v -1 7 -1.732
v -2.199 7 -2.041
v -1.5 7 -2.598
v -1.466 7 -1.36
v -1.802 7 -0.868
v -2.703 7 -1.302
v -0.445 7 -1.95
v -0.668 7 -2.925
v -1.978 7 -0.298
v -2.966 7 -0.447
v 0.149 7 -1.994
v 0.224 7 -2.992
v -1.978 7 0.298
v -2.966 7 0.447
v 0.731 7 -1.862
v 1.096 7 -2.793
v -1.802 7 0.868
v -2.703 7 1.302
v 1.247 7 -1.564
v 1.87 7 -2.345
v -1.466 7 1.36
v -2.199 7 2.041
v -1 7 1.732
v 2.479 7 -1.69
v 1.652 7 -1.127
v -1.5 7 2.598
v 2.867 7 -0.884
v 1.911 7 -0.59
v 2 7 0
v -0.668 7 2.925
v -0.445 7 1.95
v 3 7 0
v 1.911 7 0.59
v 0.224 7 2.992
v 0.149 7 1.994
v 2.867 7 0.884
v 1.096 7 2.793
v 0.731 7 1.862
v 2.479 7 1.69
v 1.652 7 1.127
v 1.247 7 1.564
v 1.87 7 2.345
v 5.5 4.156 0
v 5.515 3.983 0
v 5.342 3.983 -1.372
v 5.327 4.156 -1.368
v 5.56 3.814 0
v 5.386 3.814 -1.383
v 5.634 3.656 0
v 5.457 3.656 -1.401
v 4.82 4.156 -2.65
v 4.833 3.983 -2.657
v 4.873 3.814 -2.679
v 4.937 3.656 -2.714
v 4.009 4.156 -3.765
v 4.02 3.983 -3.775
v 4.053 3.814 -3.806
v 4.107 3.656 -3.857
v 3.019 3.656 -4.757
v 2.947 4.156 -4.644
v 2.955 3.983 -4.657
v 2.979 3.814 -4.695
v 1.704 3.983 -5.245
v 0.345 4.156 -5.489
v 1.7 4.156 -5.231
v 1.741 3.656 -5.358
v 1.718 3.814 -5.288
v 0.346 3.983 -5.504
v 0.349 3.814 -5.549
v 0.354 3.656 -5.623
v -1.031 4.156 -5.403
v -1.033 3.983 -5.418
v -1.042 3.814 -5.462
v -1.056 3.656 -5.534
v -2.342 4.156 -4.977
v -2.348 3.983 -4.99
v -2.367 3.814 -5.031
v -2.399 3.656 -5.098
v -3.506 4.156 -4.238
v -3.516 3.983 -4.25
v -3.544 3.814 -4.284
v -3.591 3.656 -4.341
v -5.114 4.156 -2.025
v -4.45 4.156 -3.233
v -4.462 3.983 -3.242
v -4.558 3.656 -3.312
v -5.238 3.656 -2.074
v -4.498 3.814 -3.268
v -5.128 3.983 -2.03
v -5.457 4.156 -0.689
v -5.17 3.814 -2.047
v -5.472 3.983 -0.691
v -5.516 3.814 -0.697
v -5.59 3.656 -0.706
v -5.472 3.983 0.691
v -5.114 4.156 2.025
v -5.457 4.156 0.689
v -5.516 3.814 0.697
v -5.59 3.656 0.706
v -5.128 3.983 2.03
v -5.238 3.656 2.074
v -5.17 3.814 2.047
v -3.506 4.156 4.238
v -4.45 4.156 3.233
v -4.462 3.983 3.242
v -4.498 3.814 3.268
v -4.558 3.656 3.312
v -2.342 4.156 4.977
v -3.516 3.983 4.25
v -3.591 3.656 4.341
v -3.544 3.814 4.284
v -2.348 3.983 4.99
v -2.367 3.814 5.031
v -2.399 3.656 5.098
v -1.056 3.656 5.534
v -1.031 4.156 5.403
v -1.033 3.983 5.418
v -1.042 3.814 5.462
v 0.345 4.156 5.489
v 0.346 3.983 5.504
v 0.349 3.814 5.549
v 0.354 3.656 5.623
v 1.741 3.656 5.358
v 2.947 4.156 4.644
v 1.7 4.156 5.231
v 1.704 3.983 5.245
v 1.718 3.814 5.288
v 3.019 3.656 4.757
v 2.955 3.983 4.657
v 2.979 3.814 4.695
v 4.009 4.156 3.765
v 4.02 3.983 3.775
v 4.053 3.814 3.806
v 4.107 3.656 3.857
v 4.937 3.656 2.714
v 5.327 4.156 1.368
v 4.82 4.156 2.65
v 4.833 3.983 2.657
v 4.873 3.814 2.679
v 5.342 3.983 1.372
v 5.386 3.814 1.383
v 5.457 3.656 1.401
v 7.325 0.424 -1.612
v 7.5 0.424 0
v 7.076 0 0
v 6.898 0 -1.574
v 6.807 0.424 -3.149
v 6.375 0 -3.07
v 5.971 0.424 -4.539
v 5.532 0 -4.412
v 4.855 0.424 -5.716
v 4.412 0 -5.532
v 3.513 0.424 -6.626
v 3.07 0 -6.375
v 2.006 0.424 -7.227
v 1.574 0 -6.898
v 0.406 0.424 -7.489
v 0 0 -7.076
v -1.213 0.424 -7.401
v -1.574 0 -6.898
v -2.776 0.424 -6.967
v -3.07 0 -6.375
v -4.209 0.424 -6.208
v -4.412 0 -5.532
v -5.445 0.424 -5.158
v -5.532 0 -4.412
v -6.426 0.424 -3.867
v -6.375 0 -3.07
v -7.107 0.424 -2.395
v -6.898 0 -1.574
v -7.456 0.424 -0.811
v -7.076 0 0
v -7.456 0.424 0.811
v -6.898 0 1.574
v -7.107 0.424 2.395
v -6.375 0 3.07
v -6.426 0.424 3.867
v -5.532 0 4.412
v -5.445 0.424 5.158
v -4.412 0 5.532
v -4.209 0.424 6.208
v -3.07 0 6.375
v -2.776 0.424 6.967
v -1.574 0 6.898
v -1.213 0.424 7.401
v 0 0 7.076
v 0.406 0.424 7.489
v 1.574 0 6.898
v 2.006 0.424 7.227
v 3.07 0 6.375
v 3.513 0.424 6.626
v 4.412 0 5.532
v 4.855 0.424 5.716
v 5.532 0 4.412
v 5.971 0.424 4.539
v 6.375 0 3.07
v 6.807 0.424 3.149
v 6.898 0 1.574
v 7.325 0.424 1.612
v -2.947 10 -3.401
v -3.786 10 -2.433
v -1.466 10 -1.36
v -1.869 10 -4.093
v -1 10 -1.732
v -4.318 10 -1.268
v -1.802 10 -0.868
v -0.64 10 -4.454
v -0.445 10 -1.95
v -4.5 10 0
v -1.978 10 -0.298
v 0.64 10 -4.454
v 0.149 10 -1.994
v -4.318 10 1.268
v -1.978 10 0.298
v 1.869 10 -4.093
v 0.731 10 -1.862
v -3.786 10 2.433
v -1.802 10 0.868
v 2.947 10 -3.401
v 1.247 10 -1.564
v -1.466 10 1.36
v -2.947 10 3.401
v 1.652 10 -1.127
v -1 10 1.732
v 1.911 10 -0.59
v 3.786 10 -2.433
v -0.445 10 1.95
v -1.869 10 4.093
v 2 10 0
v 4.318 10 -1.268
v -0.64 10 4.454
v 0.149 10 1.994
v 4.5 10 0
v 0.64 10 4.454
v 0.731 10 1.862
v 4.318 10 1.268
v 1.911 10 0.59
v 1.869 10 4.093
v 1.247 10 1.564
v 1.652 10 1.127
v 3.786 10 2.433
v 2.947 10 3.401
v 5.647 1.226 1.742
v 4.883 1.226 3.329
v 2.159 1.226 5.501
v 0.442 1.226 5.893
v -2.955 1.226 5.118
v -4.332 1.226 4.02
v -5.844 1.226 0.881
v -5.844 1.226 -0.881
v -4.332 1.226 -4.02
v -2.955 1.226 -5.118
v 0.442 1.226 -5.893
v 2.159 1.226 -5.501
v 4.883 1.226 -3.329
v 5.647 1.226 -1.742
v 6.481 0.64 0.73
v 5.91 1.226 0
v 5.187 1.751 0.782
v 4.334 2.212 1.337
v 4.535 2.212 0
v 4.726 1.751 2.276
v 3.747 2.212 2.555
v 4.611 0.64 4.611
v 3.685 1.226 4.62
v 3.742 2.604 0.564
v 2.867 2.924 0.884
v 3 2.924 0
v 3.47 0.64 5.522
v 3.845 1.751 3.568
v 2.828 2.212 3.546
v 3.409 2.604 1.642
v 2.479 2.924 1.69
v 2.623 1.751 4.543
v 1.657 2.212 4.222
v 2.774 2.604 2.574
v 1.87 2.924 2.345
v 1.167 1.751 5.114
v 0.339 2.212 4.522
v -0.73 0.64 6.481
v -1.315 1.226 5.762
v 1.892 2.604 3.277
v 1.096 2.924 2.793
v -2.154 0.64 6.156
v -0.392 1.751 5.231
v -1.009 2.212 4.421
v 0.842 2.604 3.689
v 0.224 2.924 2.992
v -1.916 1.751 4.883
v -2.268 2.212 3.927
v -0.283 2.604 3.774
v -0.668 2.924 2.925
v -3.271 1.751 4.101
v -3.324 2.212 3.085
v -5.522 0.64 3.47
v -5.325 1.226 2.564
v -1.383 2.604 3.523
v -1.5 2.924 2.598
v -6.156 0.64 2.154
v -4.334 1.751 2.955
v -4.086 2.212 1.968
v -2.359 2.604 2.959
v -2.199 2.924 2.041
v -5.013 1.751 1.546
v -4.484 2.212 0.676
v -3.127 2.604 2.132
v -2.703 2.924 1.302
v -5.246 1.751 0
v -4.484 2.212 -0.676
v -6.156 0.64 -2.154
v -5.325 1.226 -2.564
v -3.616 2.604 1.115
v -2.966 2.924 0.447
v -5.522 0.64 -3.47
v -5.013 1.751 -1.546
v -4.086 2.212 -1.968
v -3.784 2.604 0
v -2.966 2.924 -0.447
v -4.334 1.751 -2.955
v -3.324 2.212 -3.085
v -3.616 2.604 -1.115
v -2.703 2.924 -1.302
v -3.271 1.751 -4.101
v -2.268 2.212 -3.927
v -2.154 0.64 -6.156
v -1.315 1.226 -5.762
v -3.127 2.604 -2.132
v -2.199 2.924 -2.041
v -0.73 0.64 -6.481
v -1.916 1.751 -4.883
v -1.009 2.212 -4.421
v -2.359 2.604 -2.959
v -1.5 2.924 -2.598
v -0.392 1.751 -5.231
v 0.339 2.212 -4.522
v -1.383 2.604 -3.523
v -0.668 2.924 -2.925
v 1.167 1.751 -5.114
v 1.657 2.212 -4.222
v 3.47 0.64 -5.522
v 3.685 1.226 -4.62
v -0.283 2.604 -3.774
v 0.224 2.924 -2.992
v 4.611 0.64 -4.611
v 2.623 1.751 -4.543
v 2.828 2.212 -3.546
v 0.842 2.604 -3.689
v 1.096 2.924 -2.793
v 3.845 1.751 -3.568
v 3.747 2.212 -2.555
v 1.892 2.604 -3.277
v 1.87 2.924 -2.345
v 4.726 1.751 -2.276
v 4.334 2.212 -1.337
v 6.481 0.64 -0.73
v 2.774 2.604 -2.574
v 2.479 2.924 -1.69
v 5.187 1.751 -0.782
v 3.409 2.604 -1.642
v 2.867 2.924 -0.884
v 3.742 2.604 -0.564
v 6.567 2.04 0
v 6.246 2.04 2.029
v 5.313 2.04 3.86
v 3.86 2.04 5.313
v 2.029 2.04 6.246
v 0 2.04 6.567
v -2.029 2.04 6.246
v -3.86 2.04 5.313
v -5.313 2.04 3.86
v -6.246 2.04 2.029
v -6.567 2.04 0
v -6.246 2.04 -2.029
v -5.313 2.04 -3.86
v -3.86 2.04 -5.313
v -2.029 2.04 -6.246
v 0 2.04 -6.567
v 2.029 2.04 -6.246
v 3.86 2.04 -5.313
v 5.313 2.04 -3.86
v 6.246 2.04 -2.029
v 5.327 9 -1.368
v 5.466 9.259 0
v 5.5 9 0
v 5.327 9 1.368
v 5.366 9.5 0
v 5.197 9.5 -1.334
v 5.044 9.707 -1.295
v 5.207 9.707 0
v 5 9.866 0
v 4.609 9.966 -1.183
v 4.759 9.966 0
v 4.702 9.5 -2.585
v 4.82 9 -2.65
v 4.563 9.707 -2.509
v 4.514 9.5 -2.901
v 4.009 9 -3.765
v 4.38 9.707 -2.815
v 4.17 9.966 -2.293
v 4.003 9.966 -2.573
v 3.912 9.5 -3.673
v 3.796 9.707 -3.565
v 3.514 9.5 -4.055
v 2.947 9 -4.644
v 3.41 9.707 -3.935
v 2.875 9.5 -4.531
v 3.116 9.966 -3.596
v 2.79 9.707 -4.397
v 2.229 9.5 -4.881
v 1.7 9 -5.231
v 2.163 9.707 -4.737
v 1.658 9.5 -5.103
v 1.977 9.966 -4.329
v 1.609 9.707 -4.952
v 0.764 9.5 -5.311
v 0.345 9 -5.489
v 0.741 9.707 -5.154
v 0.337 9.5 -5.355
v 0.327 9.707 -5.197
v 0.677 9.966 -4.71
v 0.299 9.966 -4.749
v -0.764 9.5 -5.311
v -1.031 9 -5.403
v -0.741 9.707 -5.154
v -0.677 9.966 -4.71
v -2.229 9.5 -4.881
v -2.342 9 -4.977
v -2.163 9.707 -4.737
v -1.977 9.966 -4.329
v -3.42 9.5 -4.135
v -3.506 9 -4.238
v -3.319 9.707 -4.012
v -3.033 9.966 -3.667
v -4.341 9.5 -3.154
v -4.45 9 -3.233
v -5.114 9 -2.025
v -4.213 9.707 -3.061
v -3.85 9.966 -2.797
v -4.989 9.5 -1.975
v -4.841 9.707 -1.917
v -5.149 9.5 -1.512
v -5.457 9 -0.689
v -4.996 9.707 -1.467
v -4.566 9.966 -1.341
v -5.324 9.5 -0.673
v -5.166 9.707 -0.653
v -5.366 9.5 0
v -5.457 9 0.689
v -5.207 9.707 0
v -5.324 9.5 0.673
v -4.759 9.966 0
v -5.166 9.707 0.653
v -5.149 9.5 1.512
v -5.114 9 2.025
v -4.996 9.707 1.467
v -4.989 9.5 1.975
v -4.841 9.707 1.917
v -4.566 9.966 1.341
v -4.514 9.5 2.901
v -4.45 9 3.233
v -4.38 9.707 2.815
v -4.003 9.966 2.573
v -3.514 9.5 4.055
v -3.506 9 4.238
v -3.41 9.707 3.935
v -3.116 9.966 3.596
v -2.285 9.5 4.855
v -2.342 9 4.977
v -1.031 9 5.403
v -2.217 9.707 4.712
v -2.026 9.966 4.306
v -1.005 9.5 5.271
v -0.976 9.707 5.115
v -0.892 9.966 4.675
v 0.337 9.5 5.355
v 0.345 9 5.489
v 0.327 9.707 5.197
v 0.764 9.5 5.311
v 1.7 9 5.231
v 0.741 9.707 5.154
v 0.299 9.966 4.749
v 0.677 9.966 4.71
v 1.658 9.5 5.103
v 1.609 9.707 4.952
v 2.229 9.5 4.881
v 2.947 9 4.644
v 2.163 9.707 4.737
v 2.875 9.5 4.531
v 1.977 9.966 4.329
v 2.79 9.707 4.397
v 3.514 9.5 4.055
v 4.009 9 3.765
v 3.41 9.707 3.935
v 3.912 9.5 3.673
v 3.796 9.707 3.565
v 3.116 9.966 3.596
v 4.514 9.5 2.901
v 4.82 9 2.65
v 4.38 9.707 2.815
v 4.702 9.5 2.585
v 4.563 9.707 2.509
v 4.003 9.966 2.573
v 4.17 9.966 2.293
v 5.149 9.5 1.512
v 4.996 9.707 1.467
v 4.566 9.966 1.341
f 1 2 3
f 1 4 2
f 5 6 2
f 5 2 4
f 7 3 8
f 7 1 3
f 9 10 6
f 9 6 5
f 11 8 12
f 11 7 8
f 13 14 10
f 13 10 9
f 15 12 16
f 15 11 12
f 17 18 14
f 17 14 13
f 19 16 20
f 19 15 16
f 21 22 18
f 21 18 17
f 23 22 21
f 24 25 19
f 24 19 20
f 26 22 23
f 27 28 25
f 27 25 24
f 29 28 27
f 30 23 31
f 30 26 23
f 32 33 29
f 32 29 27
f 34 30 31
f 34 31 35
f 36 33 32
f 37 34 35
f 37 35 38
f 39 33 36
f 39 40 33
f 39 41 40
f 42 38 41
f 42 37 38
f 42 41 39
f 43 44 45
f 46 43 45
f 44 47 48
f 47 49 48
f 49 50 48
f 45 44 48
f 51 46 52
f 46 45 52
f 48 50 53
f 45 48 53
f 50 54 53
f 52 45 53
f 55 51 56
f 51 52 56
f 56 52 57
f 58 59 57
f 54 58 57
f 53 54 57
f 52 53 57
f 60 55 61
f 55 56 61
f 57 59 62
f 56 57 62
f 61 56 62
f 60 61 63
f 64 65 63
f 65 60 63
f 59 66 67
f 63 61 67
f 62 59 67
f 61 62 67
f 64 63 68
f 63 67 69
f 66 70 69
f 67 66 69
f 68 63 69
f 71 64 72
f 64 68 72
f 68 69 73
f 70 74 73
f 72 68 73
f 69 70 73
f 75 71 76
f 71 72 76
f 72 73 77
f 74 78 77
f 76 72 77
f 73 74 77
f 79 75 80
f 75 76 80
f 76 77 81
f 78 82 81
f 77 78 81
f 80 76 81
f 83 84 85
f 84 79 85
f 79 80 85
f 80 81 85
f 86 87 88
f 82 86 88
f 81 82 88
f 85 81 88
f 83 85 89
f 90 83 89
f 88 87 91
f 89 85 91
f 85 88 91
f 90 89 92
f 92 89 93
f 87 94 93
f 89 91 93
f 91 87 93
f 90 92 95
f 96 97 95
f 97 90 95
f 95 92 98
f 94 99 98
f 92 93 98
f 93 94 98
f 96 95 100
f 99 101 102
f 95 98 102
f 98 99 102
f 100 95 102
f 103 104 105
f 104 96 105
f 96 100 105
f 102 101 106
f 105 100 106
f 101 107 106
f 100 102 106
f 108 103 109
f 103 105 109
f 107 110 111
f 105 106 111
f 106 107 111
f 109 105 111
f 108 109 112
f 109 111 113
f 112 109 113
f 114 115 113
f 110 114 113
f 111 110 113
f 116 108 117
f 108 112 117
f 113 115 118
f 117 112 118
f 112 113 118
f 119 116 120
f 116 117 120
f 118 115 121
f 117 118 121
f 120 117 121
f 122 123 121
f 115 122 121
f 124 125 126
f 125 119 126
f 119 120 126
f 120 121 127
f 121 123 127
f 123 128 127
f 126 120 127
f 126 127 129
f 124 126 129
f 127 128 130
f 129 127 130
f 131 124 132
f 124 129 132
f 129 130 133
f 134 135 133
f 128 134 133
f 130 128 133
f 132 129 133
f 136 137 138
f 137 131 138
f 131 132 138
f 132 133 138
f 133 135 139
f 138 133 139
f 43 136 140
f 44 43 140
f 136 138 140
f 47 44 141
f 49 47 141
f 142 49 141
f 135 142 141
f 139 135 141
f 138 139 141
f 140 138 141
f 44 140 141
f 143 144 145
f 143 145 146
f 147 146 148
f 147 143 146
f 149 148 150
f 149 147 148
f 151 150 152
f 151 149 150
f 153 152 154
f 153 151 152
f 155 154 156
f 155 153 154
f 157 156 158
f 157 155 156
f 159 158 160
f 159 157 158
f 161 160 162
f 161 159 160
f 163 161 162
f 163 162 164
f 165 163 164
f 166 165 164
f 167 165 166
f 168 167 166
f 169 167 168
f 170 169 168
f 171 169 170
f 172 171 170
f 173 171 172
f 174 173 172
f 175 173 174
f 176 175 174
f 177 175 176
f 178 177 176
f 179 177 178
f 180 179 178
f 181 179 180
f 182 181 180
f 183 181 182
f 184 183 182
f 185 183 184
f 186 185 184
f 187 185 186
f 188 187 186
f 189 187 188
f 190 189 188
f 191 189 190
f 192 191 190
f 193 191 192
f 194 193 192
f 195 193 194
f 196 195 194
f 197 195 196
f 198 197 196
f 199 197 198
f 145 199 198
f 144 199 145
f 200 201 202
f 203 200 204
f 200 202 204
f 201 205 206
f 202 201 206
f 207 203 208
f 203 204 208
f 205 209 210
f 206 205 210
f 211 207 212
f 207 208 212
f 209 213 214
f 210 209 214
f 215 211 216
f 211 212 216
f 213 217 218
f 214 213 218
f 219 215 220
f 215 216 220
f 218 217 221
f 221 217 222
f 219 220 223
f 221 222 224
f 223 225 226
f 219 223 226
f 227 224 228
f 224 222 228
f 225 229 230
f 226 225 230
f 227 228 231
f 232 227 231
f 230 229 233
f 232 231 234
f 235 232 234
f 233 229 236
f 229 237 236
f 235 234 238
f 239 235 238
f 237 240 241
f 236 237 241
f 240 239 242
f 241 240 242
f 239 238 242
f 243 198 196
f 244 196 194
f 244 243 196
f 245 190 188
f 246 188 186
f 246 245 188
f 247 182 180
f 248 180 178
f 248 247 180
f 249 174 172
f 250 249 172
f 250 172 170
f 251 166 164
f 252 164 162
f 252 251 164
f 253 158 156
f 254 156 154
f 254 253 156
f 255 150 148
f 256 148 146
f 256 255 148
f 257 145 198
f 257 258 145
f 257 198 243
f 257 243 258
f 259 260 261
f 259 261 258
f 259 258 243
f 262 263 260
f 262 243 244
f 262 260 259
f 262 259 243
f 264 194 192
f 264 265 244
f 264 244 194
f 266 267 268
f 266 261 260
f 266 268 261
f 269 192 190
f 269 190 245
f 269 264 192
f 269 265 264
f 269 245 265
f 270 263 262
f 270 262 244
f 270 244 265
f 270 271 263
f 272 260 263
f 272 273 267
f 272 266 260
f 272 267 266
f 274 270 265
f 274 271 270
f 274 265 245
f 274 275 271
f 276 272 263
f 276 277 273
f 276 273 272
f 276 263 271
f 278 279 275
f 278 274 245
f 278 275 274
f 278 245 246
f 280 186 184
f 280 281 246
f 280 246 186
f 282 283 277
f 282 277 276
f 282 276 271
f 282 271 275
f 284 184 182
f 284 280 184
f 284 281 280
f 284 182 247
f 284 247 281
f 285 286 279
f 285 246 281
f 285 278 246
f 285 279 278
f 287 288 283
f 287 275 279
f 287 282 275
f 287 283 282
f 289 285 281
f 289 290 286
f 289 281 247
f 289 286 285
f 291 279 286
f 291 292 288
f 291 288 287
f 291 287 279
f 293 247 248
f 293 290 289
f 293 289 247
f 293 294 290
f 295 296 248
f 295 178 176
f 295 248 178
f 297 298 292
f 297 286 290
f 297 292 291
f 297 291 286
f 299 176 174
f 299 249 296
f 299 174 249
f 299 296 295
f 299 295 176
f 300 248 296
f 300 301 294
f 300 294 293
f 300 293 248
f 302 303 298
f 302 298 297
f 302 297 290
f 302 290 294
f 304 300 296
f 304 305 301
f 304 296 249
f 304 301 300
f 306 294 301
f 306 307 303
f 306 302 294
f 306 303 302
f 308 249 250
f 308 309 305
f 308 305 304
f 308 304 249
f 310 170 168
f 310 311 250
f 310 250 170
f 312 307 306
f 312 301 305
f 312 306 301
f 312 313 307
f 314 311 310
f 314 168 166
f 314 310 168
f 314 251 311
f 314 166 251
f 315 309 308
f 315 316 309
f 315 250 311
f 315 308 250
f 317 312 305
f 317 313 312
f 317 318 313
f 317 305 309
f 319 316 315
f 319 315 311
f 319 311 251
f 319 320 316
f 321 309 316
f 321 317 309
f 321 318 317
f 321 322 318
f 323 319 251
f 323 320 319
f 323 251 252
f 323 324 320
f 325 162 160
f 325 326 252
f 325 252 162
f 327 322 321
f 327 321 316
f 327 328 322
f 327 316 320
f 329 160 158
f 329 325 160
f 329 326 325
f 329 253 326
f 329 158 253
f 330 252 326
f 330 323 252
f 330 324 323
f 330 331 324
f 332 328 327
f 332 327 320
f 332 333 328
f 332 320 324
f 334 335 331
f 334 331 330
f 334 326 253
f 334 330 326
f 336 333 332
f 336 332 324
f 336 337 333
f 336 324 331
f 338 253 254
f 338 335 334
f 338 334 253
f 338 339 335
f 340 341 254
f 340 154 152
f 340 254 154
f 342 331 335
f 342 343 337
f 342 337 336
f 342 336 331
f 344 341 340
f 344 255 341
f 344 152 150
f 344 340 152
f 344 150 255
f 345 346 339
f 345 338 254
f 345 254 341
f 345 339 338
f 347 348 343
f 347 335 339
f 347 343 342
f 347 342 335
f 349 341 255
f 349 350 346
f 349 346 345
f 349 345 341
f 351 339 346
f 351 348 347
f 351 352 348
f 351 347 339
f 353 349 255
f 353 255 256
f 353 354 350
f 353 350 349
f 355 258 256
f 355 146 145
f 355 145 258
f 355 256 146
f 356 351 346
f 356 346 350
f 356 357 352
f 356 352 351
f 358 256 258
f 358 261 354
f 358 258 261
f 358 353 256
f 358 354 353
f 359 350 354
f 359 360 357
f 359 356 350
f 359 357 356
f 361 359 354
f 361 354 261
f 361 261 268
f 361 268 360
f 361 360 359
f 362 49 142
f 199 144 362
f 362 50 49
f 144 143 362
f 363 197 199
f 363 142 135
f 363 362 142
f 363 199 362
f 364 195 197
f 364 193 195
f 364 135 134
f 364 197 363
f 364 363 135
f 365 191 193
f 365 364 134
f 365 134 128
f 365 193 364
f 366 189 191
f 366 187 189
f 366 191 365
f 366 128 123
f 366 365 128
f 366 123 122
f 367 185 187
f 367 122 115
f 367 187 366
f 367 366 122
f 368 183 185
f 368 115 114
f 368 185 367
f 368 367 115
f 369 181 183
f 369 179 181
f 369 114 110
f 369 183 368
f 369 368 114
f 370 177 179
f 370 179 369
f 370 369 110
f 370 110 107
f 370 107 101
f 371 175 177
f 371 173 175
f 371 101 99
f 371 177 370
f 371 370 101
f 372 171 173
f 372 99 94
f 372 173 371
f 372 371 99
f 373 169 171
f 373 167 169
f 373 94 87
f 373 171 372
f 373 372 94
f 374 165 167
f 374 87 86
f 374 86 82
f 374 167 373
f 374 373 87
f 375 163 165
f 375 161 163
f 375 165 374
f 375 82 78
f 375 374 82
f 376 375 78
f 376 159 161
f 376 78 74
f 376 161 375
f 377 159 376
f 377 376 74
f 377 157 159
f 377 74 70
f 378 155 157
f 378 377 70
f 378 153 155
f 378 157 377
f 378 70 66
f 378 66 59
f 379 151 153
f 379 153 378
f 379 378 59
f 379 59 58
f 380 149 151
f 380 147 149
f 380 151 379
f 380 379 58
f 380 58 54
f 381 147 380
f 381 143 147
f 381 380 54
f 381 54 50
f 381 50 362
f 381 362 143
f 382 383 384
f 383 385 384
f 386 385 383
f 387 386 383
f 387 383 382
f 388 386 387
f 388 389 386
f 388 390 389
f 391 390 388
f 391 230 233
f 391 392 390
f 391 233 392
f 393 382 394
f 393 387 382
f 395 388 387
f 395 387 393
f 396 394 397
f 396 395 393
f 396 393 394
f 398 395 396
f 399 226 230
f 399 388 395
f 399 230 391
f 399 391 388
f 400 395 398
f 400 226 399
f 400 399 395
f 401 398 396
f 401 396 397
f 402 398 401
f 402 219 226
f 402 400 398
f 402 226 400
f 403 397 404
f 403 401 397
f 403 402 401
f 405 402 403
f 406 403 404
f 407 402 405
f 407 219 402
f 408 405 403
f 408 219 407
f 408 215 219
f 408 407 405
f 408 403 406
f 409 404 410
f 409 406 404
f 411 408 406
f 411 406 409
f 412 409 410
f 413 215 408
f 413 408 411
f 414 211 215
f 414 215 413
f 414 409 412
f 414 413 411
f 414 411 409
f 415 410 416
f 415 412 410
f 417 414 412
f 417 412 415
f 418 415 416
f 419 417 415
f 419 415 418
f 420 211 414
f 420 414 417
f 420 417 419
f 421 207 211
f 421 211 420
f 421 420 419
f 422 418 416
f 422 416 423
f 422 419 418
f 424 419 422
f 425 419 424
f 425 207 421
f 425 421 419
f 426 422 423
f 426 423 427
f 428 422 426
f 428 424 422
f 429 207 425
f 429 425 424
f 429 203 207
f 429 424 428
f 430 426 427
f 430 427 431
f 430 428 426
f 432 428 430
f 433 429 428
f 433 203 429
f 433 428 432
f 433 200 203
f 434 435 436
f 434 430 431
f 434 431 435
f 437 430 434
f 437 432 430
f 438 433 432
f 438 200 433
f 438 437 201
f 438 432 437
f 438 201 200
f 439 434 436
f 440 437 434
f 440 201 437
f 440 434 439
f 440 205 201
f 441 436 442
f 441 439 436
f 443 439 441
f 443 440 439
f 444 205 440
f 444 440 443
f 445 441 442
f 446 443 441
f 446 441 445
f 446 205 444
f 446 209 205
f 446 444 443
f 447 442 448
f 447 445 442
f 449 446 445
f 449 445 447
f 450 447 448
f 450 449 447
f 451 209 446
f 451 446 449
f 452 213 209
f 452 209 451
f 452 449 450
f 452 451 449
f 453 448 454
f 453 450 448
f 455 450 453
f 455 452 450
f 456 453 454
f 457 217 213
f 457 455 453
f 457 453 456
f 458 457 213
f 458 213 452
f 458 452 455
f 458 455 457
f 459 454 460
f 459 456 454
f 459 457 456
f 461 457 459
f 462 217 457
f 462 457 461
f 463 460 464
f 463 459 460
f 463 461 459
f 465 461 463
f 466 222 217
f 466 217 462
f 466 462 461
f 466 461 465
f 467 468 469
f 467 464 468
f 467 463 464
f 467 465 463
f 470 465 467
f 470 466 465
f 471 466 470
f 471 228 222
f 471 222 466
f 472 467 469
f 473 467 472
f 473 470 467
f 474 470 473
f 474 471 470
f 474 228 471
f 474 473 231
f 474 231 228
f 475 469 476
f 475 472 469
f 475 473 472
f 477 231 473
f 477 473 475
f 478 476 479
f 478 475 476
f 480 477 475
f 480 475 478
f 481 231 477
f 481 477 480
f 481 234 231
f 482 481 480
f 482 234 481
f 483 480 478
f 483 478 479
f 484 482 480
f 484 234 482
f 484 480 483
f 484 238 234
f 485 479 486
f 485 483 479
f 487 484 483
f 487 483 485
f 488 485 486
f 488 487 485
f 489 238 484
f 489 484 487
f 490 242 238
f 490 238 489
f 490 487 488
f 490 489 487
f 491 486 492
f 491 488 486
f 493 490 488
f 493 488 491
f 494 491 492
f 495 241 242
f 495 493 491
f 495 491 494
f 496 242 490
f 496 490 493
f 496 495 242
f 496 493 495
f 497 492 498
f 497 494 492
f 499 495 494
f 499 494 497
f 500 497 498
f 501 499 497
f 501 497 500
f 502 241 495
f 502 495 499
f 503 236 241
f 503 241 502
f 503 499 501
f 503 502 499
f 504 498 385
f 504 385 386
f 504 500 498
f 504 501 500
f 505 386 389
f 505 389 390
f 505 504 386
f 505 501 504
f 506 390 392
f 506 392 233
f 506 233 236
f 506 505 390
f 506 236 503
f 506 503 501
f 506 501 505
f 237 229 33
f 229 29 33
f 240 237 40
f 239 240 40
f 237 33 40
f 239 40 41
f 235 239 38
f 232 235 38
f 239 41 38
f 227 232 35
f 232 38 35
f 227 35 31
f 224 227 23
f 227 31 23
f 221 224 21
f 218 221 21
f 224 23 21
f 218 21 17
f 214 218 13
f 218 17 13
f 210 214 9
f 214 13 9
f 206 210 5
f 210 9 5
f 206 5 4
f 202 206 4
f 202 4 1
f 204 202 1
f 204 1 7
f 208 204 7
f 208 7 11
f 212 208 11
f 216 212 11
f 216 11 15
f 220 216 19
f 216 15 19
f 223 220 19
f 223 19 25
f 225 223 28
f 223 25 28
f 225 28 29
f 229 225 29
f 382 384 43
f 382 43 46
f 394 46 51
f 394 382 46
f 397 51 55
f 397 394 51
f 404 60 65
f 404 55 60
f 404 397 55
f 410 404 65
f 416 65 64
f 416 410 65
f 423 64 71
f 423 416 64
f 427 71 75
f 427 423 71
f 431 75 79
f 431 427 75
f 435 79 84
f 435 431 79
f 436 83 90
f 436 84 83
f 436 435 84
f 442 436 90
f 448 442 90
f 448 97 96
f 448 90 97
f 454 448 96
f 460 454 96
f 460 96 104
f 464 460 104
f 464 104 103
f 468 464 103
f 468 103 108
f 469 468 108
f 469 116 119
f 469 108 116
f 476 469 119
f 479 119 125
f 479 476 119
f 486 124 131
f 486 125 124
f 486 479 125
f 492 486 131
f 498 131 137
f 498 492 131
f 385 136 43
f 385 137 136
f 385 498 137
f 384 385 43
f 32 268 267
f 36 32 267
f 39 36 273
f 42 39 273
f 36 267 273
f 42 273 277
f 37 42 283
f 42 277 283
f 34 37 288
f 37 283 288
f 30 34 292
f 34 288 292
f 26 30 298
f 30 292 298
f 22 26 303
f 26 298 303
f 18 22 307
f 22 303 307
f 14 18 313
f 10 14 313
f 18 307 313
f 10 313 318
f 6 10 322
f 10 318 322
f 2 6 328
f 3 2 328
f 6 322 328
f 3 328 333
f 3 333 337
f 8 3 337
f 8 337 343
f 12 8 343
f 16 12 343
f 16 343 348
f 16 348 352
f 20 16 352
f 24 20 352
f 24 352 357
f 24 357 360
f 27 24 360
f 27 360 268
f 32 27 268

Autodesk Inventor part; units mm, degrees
sketch "Sketch_1" plane through (0, 0, 0) normal (0, 0, 1) x (1, 0, 0)
  line L0 (0, 0) -> (0, 10)
  line L1 (2, 7) -> (3, 7)
  line L2 (3, 7) -> (3, 2.9235)
  arc A0 (7.0757, 0) -> (3, 2.9235) centre (0, -5.5618) ccw
  line L3 (7.0757, 0) -> (7.5, 0.4243)
  line L4 (7.5, 0.4243) -> (5.634, 3.6563)
  arc A1 (5.5, 4.1563) -> (5.634, 3.6563) centre (6.5, 4.1563) ccw
  line L5 (5.5, 4.1563) -> (5.5, 9)
  arc A2 (5.5, 9) -> (4.5, 10) centre (4.5, 9) ccw
  line L6 (4.5, 10) -> (2, 10)
  line L7 (2, 10) -> (2, 7)
revolve "Revolution1" add sketch "Sketch_1" angle 360 about axis through (0, 0, 0) along (0, -1, 0)
ref_plane "IP_dummy_XY" through (0, 0, 0) normal (0, 1, 0) x (1, 0, 0)
ref_plane "IP_dummy_YZ" through (0, 0, 0) normal (1, 0, 0) x (0, 0, -1)
ref_plane "IP_dummy_ZX" through (0, 0, 0) normal (0, 0, -1) x (0, 1, 0)
ref_plane "IP_screw_XY" through (0, 7, 0) normal (0, 1, 0) x (1, 0, 0)
ref_plane "IP_screw_YZ" through (0, 7, 0) normal (1, 0, 0) x (0, 0, -1)
ref_plane "IP_screw_ZX" through (0, 7, 0) normal (0, 0, -1) x (0, 1, 0)
properties part number "VP15AS"
